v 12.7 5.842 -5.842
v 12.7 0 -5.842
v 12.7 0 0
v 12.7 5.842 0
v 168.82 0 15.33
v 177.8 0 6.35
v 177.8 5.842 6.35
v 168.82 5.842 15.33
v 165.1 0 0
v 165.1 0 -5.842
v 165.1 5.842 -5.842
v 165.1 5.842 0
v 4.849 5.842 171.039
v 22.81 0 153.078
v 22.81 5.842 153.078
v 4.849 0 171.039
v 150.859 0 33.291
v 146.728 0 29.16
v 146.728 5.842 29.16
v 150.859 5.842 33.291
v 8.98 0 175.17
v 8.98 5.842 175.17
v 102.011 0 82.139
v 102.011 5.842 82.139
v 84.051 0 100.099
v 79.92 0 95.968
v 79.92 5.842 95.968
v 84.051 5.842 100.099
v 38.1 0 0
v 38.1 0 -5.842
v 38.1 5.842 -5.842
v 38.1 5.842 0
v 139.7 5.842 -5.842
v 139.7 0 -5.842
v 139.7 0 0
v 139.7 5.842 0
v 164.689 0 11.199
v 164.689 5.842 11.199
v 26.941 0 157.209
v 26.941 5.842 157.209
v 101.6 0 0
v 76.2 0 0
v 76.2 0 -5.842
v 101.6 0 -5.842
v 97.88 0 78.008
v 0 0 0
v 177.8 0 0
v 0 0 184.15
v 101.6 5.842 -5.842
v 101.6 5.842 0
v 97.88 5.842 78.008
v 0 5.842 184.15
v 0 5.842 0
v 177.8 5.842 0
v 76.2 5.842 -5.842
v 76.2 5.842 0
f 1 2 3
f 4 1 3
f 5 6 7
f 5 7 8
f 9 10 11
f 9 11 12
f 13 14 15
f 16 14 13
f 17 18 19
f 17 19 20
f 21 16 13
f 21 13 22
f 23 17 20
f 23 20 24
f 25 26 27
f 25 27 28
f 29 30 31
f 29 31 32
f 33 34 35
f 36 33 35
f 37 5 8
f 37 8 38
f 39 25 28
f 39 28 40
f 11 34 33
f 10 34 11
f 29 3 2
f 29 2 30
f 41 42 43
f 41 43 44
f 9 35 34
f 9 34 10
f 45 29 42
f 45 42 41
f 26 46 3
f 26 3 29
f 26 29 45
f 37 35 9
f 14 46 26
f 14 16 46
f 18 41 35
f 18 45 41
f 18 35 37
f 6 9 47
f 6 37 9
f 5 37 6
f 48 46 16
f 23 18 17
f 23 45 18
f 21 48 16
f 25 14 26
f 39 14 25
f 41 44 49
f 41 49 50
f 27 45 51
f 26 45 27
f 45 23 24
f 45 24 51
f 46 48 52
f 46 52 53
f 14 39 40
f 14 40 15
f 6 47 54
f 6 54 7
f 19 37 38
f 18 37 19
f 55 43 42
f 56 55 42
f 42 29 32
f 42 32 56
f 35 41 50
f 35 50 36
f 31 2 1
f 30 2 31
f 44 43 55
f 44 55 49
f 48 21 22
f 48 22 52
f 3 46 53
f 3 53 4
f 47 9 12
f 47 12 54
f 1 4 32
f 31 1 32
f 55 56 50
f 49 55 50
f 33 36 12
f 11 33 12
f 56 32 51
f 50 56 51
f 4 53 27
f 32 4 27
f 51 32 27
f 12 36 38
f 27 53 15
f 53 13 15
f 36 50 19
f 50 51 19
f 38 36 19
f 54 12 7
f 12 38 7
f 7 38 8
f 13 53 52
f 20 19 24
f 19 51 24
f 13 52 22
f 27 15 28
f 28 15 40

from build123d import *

# Parameters (mm, degrees)
F0_W     = 25.4
F0_H     = 5.842
F1_DEPTH = 5.842


with BuildPart() as f1:
    # F0 (on Front) → F1 (new body)
    with BuildSketch(Plane.XZ):
        Polygon((8.980256, 175.169744), (0, 184.15), (0, 0), (12.7, 0), (38.1, 0), (76.2, 0), (101.6, 0), (139.7, 0), (165.1, 0), (177.8, 0), (177.8, 6.35), (168.819744, 15.330256), (164.688826, 11.199338), (146.728314, 29.159851), (150.859232, 33.290768), (102.011174, 82.138826), (97.880256, 78.007908), (79.919744, 95.96842), (84.050662, 100.099338), (26.940768, 157.209232), (22.809851, 153.078314), (4.849338, 171.038826), align=None)
        with Locations((25.4, -2.921)):
            Rectangle(F0_W, F0_H)
        with Locations((152.4, -2.921)):
            Rectangle(F0_W, F0_H)
        with Locations((88.9, -2.921)):
            Rectangle(F0_W, F0_H)
    extrude(amount=-F1_DEPTH)


solid = f1.part
